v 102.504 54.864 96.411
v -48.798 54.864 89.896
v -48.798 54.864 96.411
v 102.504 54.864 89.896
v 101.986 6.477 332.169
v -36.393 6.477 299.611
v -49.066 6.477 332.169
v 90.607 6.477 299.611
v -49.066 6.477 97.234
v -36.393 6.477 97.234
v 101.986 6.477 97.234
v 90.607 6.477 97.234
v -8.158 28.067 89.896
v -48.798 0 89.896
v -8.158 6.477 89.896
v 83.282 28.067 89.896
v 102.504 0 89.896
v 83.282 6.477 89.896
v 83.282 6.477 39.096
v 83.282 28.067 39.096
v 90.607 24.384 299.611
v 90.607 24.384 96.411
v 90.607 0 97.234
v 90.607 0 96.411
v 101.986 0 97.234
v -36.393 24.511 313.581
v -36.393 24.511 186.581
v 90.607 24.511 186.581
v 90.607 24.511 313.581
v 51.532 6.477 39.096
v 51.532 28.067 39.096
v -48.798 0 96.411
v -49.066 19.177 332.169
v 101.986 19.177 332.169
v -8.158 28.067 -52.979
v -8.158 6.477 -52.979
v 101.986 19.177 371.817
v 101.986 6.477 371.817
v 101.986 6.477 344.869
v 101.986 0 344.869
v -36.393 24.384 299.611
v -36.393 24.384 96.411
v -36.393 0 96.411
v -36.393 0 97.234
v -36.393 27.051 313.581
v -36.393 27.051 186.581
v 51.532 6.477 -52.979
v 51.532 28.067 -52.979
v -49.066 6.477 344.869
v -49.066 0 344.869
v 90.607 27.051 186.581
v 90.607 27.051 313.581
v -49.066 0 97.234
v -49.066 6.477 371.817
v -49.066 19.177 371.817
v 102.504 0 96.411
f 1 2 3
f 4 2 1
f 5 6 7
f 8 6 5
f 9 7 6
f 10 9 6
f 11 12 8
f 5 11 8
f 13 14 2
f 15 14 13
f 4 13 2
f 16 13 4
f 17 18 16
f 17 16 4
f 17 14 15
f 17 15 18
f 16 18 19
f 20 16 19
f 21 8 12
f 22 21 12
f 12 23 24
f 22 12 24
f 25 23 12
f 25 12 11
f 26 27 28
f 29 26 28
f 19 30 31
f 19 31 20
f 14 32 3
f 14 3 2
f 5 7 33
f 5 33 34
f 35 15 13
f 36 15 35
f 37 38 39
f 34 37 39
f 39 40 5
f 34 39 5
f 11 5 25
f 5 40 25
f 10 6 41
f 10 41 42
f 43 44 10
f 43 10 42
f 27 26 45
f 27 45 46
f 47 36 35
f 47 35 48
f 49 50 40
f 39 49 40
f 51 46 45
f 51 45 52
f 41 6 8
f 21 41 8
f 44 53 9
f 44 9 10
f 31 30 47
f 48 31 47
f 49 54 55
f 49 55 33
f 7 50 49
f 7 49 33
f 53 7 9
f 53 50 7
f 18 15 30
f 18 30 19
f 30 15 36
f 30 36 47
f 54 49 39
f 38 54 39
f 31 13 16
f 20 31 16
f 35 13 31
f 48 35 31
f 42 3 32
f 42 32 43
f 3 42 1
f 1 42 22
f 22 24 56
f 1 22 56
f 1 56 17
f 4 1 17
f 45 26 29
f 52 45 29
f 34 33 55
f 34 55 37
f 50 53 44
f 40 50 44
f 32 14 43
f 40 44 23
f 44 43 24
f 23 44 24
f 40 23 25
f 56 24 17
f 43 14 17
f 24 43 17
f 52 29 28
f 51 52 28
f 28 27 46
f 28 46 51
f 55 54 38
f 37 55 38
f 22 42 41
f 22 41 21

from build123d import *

# Parameters (mm, degrees)
SKETCH3_W            = 151.302132641
SKETCH3_H            = 6.5151
BOSS_EXTRUDE1_DEPTH  = 54.864
SKETCH3_13_W         = 151.052545821
SKETCH3_13_H         = 247.635016114
BOSS_EXTRUDE4_DEPTH  = 6.477
BOSS_EXTRUDE5_START  = 6.477
SKETCH3_14_W         = 151.052545821
SKETCH3_14_H         = 39.648003702
BOSS_EXTRUDE5_DEPTH  = 12.7
SKETCH3_15_W         = 127
SKETCH3_15_H         = 203.2
BOSS_EXTRUDE6_DEPTH  = 24.384
BOSS_EXTRUDE7_START  = 24.511
SKETCH3_16_W         = 127
SKETCH3_16_H         = 127
BOSS_EXTRUDE7_DEPTH  = 2.54
BOSS_EXTRUDE12_START = 6.477
SKETCH3_22_W         = 31.75
SKETCH3_22_H         = 50.8
BOSS_EXTRUDE12_DEPTH = 21.59
BOSS_EXTRUDE13_START = 6.477
SKETCH3_23_W         = 59.69
SKETCH3_23_H         = 142.875
BOSS_EXTRUDE13_DEPTH = 21.59


with BuildPart() as part:
    # Sketch3 → Boss-Extrude1 (new body)
    with BuildSketch(Plane(origin=(0, 0, 0), x_dir=(1, 0, 0), z_dir=(0, 1, 0))):
        with Locations((26.853160792, -93.15368855)):
            Rectangle(SKETCH3_W, SKETCH3_H)
    extrude(amount=BOSS_EXTRUDE1_DEPTH)



with BuildPart() as body_2:
    # Sketch3<13> → Boss-Extrude4 (new body)
    with BuildSketch(Plane(origin=(0, 0, 0), x_dir=(1, 0, 0), z_dir=(0, 1, 0))):
        with Locations((26.460014629, -221.051383358)):
            Rectangle(SKETCH3_13_W, SKETCH3_13_H)
    extrude(amount=BOSS_EXTRUDE4_DEPTH)

    # Sketch3<14> → Boss-Extrude5 (add)
    with BuildSketch(Plane(origin=(0, 0, 0), x_dir=(1, 0, 0), z_dir=(0, 1, 0)).offset(BOSS_EXTRUDE5_START)):
        with Locations((26.460014629, -351.992893266)):
            Rectangle(SKETCH3_14_W, SKETCH3_14_H)
    extrude(amount=BOSS_EXTRUDE5_DEPTH)


with BuildPart() as part_1:
    add(part.part)

    add(body_2.part)  # Boss-Extrude6 merges body 2
    # Sketch3<15> → Boss-Extrude6 (add)
    with BuildSketch(Plane(origin=(0, 0, 0), x_dir=(1, 0, 0), z_dir=(0, 1, 0))):
        with Locations((27.107070751, -198.01123855)):
            Rectangle(SKETCH3_15_W, SKETCH3_15_H)
    extrude(amount=BOSS_EXTRUDE6_DEPTH)

    # Sketch3<22> → Boss-Extrude12 (add)
    with BuildSketch(Plane(origin=(0, 0, 0), x_dir=(1, 0, 0), z_dir=(0, 1, 0)).offset(BOSS_EXTRUDE12_START)):
        with Locations((67.407094471, -64.49613855)):
            Rectangle(SKETCH3_22_W, SKETCH3_22_H)
    extrude(amount=BOSS_EXTRUDE12_DEPTH)

    # Sketch3<23> → Boss-Extrude13 (add)
    with BuildSketch(Plane(origin=(0, 0, 0), x_dir=(1, 0, 0), z_dir=(0, 1, 0)).offset(BOSS_EXTRUDE13_START)):
        with Locations((21.687094471, -18.45863855)):
            Rectangle(SKETCH3_23_W, SKETCH3_23_H)
    extrude(amount=BOSS_EXTRUDE13_DEPTH)


with BuildPart() as body_2_2:
    # Sketch3<16> → Boss-Extrude7 (new body)
    with BuildSketch(Plane(origin=(0, 0, 0), x_dir=(1, 0, 0), z_dir=(0, 1, 0)).offset(BOSS_EXTRUDE7_START)):
        with Locations((27.107070751, -250.08123855)):
            Rectangle(SKETCH3_16_W, SKETCH3_16_H)
    extrude(amount=BOSS_EXTRUDE7_DEPTH)


solid = Compound([part_1.part, body_2_2.part])
